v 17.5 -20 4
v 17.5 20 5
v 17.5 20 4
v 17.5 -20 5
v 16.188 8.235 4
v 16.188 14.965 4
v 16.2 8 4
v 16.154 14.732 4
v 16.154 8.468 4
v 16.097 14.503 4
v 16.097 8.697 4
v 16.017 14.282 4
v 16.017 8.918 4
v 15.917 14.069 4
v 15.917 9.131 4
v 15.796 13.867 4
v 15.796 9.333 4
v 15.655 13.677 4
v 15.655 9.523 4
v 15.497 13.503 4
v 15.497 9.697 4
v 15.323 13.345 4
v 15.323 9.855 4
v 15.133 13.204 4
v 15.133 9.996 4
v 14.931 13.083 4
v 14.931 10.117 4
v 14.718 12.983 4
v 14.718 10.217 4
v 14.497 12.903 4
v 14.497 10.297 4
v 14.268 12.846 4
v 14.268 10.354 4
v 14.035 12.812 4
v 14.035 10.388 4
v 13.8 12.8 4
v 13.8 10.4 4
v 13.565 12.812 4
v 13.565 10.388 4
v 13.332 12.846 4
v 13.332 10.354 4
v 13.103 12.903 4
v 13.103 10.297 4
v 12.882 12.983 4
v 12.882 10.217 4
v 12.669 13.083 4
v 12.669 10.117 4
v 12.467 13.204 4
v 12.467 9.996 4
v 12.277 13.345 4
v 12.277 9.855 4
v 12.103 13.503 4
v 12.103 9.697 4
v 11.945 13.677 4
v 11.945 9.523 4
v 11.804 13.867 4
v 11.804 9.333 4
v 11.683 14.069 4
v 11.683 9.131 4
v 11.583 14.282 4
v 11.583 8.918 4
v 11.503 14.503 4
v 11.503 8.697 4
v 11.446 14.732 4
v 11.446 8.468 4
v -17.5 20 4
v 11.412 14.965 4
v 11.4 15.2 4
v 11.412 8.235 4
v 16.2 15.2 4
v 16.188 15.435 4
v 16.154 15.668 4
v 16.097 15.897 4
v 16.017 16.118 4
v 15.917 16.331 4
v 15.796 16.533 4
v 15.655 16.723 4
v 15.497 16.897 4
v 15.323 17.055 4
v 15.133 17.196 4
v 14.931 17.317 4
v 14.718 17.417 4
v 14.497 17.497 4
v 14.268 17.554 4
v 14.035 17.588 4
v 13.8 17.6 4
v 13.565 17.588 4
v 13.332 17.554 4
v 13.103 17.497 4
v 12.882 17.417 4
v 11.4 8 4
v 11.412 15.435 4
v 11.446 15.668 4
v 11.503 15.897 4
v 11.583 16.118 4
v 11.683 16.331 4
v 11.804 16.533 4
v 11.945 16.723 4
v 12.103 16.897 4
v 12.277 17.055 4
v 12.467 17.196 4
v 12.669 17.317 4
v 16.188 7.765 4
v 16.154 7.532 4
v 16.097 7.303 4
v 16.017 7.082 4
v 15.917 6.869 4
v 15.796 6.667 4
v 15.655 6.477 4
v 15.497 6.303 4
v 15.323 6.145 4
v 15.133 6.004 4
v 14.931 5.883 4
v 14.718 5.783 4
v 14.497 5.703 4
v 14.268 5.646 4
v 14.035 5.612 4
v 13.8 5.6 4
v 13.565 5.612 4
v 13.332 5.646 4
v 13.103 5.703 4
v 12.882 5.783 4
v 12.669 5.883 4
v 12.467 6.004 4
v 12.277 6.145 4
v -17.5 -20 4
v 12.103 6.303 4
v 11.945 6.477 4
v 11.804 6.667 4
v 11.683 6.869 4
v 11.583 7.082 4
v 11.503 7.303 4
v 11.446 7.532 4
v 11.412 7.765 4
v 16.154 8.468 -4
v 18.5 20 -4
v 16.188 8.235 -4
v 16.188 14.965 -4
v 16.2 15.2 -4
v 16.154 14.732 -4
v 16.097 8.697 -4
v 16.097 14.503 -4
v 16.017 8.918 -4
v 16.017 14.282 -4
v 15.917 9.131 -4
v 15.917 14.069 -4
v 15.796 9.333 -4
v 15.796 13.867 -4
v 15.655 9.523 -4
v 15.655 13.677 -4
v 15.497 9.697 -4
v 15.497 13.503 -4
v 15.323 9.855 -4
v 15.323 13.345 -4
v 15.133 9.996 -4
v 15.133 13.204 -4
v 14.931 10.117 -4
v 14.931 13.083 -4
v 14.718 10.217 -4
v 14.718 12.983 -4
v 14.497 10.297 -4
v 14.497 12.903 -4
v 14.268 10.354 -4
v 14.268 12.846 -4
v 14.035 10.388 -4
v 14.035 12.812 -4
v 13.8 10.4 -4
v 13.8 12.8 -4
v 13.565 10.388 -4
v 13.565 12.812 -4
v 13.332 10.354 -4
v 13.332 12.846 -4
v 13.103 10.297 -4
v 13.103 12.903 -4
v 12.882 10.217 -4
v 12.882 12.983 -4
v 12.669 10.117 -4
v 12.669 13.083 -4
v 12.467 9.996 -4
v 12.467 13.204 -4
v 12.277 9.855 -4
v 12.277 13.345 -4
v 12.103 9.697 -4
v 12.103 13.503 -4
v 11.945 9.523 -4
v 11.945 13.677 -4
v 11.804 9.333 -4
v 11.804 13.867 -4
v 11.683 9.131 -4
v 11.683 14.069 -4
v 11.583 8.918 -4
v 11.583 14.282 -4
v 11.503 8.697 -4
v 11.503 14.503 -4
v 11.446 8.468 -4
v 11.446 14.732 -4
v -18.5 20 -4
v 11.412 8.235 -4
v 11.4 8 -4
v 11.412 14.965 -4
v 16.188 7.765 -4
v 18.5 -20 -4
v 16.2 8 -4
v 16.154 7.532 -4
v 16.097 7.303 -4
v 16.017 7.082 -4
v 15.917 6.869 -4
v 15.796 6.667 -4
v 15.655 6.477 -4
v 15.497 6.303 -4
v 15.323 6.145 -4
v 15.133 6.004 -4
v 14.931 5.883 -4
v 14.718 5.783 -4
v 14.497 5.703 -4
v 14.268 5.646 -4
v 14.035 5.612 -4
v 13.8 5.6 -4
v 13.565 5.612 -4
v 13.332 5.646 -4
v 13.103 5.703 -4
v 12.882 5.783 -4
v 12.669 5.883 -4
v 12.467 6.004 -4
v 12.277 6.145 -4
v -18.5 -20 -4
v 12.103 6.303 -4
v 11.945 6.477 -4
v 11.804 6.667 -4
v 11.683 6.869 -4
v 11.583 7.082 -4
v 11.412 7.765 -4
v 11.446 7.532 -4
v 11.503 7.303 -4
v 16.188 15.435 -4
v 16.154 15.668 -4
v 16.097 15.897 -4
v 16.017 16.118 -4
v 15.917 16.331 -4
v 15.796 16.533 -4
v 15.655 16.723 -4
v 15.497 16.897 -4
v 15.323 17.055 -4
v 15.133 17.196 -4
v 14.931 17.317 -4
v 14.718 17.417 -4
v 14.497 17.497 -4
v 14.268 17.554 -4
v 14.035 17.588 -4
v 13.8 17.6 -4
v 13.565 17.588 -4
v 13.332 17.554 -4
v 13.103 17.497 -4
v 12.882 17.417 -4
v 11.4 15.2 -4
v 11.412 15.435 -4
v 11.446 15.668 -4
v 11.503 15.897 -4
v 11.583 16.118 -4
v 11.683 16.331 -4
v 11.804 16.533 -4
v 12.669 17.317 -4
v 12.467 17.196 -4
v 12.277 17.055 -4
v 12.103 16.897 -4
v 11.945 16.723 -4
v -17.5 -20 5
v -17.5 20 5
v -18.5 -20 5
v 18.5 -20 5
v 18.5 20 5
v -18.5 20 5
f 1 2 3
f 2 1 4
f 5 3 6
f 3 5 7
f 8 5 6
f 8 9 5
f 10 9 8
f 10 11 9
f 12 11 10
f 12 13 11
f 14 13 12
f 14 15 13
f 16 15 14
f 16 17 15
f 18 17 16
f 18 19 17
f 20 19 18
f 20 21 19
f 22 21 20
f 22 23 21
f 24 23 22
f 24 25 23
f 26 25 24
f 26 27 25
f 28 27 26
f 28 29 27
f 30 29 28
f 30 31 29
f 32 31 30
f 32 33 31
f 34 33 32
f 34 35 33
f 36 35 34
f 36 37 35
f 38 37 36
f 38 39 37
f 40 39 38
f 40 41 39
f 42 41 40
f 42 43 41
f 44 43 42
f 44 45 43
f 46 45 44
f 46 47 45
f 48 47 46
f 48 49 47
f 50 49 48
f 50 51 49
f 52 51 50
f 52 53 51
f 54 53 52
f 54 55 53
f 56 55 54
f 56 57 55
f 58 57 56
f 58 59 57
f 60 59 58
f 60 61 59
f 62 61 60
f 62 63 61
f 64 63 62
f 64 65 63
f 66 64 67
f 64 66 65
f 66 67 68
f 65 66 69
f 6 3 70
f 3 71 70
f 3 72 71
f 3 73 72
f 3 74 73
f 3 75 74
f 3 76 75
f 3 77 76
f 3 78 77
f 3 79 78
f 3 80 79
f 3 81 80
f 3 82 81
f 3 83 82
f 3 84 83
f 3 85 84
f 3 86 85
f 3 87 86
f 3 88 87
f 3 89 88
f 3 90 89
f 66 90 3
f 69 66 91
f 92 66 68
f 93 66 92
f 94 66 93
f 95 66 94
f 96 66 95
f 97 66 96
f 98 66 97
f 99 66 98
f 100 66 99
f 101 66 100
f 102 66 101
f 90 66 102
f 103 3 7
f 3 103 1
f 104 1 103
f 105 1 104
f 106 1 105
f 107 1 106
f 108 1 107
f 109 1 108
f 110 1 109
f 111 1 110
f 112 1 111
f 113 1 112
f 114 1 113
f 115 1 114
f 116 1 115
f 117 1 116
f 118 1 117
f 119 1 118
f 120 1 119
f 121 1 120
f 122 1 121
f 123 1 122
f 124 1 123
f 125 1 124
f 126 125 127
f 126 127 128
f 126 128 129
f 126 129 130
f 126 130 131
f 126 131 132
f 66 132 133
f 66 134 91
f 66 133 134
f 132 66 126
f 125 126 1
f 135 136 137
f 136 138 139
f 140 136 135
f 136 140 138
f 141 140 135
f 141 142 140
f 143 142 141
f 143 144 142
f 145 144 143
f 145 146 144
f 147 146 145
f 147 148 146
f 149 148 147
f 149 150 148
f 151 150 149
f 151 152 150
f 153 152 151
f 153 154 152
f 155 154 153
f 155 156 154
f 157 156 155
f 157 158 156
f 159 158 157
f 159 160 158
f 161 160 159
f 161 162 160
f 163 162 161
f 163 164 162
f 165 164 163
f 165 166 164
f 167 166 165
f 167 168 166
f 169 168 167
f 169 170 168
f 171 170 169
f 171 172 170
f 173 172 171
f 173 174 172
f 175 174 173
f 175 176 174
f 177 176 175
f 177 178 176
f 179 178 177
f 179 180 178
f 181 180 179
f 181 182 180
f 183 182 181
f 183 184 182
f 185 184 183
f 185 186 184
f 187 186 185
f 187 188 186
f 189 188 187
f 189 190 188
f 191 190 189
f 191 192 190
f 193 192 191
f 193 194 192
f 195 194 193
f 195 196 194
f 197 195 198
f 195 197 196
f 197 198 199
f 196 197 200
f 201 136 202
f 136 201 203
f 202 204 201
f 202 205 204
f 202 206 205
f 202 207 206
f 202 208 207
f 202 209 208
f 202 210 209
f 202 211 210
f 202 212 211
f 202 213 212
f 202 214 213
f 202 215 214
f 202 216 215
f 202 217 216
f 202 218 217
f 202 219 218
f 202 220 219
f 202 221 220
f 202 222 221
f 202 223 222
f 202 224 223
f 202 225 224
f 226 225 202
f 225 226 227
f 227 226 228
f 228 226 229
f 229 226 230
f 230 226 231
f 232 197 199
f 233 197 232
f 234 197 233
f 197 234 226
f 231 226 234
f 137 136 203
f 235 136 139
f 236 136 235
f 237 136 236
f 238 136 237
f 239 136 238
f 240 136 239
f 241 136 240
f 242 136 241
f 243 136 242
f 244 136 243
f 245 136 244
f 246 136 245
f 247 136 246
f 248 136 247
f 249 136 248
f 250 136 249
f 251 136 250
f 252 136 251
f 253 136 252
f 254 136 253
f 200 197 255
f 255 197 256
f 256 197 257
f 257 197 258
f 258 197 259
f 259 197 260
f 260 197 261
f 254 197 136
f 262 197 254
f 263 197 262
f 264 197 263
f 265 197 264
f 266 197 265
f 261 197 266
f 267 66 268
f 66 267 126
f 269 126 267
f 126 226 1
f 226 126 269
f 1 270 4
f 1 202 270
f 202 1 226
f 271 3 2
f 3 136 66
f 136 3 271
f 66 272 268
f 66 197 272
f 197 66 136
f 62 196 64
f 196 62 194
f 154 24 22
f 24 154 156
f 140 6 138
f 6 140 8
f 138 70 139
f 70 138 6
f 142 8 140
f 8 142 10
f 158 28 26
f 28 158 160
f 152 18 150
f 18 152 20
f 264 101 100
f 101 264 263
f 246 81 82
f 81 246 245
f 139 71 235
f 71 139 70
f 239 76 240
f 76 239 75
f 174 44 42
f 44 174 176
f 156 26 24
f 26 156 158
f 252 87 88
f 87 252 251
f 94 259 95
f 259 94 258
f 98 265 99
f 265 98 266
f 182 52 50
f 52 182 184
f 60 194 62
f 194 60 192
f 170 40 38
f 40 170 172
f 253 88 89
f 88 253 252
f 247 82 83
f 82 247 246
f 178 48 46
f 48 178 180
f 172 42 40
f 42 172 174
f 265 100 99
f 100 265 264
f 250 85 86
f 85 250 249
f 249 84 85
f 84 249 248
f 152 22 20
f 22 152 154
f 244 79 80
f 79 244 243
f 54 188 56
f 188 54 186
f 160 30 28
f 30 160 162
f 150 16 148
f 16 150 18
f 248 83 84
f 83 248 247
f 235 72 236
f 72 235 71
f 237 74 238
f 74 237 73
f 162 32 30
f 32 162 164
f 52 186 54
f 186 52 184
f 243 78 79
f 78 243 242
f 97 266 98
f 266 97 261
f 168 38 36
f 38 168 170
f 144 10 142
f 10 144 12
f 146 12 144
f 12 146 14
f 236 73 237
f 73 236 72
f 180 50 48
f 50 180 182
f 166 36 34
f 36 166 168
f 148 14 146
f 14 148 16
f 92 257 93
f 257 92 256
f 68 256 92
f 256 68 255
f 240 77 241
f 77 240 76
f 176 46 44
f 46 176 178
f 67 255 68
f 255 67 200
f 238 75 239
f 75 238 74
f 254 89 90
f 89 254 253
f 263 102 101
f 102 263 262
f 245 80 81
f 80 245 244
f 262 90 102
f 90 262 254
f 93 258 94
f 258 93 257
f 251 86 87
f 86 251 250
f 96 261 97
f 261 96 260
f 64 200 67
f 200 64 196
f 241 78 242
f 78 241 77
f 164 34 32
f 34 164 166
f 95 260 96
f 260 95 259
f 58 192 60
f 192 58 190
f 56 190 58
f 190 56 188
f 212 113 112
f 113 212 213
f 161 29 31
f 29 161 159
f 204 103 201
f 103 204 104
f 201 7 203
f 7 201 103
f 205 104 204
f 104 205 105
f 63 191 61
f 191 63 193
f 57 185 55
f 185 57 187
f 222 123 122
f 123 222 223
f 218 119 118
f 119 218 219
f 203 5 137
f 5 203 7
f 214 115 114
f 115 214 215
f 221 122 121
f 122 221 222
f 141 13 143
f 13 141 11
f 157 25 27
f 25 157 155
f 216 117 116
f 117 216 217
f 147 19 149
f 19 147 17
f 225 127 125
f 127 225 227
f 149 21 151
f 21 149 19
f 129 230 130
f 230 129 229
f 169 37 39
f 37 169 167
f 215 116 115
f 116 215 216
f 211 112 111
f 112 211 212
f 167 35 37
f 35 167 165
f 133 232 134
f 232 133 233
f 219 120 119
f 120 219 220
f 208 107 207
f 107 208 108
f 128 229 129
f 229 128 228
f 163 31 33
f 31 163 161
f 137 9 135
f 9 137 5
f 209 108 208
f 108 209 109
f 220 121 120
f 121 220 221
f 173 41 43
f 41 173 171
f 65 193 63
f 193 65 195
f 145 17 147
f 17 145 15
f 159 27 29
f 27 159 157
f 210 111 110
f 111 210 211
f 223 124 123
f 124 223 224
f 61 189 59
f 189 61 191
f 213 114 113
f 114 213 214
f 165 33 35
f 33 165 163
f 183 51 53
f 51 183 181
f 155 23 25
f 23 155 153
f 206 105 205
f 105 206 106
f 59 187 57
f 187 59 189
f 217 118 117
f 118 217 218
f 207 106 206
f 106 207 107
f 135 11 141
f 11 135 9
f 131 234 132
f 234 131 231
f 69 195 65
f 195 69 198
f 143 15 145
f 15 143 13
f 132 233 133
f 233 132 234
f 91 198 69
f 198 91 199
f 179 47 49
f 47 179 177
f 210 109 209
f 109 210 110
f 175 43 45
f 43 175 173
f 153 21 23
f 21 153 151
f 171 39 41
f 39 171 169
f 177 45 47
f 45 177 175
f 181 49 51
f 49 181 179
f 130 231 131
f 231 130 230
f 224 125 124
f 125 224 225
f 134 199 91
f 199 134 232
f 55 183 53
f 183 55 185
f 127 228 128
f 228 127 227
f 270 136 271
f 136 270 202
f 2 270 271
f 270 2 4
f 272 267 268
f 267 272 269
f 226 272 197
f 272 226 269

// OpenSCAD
// file: frontrightspacer.scad
railX=35;
railY=40;
railZ=8;
holeD=4.8;
holeX=railX/2-3.7;
hole1Y=-railY/2+4.8;
hole2Y=-railY/2+(4.5+7.5);
frameThickness=1;

module frontrightspacer()
{
difference() {
    cube([railX,railY,railZ],center=true);
    translate([holeX,hole1Y,0])cylinder(d=holeD,h=railZ,$fn=64,center=true);
    translate([holeX,hole2Y,0])cylinder(d=holeD,h=railZ,$fn=64,center=true);
}

//Frame
translate([railX/2+frameThickness/2,0,frameThickness/2])cube([frameThickness,railY,railZ+frameThickness],center=true);
translate([-railX/2-frameThickness/2,0,frameThickness/2])cube([frameThickness,railY,railZ+frameThickness],center=true);

}

frontrightspacer();
// main file
use <frontrightspacer.scad>

rotate([180,0,0])mirror([0,0,1])frontrightspacer();
